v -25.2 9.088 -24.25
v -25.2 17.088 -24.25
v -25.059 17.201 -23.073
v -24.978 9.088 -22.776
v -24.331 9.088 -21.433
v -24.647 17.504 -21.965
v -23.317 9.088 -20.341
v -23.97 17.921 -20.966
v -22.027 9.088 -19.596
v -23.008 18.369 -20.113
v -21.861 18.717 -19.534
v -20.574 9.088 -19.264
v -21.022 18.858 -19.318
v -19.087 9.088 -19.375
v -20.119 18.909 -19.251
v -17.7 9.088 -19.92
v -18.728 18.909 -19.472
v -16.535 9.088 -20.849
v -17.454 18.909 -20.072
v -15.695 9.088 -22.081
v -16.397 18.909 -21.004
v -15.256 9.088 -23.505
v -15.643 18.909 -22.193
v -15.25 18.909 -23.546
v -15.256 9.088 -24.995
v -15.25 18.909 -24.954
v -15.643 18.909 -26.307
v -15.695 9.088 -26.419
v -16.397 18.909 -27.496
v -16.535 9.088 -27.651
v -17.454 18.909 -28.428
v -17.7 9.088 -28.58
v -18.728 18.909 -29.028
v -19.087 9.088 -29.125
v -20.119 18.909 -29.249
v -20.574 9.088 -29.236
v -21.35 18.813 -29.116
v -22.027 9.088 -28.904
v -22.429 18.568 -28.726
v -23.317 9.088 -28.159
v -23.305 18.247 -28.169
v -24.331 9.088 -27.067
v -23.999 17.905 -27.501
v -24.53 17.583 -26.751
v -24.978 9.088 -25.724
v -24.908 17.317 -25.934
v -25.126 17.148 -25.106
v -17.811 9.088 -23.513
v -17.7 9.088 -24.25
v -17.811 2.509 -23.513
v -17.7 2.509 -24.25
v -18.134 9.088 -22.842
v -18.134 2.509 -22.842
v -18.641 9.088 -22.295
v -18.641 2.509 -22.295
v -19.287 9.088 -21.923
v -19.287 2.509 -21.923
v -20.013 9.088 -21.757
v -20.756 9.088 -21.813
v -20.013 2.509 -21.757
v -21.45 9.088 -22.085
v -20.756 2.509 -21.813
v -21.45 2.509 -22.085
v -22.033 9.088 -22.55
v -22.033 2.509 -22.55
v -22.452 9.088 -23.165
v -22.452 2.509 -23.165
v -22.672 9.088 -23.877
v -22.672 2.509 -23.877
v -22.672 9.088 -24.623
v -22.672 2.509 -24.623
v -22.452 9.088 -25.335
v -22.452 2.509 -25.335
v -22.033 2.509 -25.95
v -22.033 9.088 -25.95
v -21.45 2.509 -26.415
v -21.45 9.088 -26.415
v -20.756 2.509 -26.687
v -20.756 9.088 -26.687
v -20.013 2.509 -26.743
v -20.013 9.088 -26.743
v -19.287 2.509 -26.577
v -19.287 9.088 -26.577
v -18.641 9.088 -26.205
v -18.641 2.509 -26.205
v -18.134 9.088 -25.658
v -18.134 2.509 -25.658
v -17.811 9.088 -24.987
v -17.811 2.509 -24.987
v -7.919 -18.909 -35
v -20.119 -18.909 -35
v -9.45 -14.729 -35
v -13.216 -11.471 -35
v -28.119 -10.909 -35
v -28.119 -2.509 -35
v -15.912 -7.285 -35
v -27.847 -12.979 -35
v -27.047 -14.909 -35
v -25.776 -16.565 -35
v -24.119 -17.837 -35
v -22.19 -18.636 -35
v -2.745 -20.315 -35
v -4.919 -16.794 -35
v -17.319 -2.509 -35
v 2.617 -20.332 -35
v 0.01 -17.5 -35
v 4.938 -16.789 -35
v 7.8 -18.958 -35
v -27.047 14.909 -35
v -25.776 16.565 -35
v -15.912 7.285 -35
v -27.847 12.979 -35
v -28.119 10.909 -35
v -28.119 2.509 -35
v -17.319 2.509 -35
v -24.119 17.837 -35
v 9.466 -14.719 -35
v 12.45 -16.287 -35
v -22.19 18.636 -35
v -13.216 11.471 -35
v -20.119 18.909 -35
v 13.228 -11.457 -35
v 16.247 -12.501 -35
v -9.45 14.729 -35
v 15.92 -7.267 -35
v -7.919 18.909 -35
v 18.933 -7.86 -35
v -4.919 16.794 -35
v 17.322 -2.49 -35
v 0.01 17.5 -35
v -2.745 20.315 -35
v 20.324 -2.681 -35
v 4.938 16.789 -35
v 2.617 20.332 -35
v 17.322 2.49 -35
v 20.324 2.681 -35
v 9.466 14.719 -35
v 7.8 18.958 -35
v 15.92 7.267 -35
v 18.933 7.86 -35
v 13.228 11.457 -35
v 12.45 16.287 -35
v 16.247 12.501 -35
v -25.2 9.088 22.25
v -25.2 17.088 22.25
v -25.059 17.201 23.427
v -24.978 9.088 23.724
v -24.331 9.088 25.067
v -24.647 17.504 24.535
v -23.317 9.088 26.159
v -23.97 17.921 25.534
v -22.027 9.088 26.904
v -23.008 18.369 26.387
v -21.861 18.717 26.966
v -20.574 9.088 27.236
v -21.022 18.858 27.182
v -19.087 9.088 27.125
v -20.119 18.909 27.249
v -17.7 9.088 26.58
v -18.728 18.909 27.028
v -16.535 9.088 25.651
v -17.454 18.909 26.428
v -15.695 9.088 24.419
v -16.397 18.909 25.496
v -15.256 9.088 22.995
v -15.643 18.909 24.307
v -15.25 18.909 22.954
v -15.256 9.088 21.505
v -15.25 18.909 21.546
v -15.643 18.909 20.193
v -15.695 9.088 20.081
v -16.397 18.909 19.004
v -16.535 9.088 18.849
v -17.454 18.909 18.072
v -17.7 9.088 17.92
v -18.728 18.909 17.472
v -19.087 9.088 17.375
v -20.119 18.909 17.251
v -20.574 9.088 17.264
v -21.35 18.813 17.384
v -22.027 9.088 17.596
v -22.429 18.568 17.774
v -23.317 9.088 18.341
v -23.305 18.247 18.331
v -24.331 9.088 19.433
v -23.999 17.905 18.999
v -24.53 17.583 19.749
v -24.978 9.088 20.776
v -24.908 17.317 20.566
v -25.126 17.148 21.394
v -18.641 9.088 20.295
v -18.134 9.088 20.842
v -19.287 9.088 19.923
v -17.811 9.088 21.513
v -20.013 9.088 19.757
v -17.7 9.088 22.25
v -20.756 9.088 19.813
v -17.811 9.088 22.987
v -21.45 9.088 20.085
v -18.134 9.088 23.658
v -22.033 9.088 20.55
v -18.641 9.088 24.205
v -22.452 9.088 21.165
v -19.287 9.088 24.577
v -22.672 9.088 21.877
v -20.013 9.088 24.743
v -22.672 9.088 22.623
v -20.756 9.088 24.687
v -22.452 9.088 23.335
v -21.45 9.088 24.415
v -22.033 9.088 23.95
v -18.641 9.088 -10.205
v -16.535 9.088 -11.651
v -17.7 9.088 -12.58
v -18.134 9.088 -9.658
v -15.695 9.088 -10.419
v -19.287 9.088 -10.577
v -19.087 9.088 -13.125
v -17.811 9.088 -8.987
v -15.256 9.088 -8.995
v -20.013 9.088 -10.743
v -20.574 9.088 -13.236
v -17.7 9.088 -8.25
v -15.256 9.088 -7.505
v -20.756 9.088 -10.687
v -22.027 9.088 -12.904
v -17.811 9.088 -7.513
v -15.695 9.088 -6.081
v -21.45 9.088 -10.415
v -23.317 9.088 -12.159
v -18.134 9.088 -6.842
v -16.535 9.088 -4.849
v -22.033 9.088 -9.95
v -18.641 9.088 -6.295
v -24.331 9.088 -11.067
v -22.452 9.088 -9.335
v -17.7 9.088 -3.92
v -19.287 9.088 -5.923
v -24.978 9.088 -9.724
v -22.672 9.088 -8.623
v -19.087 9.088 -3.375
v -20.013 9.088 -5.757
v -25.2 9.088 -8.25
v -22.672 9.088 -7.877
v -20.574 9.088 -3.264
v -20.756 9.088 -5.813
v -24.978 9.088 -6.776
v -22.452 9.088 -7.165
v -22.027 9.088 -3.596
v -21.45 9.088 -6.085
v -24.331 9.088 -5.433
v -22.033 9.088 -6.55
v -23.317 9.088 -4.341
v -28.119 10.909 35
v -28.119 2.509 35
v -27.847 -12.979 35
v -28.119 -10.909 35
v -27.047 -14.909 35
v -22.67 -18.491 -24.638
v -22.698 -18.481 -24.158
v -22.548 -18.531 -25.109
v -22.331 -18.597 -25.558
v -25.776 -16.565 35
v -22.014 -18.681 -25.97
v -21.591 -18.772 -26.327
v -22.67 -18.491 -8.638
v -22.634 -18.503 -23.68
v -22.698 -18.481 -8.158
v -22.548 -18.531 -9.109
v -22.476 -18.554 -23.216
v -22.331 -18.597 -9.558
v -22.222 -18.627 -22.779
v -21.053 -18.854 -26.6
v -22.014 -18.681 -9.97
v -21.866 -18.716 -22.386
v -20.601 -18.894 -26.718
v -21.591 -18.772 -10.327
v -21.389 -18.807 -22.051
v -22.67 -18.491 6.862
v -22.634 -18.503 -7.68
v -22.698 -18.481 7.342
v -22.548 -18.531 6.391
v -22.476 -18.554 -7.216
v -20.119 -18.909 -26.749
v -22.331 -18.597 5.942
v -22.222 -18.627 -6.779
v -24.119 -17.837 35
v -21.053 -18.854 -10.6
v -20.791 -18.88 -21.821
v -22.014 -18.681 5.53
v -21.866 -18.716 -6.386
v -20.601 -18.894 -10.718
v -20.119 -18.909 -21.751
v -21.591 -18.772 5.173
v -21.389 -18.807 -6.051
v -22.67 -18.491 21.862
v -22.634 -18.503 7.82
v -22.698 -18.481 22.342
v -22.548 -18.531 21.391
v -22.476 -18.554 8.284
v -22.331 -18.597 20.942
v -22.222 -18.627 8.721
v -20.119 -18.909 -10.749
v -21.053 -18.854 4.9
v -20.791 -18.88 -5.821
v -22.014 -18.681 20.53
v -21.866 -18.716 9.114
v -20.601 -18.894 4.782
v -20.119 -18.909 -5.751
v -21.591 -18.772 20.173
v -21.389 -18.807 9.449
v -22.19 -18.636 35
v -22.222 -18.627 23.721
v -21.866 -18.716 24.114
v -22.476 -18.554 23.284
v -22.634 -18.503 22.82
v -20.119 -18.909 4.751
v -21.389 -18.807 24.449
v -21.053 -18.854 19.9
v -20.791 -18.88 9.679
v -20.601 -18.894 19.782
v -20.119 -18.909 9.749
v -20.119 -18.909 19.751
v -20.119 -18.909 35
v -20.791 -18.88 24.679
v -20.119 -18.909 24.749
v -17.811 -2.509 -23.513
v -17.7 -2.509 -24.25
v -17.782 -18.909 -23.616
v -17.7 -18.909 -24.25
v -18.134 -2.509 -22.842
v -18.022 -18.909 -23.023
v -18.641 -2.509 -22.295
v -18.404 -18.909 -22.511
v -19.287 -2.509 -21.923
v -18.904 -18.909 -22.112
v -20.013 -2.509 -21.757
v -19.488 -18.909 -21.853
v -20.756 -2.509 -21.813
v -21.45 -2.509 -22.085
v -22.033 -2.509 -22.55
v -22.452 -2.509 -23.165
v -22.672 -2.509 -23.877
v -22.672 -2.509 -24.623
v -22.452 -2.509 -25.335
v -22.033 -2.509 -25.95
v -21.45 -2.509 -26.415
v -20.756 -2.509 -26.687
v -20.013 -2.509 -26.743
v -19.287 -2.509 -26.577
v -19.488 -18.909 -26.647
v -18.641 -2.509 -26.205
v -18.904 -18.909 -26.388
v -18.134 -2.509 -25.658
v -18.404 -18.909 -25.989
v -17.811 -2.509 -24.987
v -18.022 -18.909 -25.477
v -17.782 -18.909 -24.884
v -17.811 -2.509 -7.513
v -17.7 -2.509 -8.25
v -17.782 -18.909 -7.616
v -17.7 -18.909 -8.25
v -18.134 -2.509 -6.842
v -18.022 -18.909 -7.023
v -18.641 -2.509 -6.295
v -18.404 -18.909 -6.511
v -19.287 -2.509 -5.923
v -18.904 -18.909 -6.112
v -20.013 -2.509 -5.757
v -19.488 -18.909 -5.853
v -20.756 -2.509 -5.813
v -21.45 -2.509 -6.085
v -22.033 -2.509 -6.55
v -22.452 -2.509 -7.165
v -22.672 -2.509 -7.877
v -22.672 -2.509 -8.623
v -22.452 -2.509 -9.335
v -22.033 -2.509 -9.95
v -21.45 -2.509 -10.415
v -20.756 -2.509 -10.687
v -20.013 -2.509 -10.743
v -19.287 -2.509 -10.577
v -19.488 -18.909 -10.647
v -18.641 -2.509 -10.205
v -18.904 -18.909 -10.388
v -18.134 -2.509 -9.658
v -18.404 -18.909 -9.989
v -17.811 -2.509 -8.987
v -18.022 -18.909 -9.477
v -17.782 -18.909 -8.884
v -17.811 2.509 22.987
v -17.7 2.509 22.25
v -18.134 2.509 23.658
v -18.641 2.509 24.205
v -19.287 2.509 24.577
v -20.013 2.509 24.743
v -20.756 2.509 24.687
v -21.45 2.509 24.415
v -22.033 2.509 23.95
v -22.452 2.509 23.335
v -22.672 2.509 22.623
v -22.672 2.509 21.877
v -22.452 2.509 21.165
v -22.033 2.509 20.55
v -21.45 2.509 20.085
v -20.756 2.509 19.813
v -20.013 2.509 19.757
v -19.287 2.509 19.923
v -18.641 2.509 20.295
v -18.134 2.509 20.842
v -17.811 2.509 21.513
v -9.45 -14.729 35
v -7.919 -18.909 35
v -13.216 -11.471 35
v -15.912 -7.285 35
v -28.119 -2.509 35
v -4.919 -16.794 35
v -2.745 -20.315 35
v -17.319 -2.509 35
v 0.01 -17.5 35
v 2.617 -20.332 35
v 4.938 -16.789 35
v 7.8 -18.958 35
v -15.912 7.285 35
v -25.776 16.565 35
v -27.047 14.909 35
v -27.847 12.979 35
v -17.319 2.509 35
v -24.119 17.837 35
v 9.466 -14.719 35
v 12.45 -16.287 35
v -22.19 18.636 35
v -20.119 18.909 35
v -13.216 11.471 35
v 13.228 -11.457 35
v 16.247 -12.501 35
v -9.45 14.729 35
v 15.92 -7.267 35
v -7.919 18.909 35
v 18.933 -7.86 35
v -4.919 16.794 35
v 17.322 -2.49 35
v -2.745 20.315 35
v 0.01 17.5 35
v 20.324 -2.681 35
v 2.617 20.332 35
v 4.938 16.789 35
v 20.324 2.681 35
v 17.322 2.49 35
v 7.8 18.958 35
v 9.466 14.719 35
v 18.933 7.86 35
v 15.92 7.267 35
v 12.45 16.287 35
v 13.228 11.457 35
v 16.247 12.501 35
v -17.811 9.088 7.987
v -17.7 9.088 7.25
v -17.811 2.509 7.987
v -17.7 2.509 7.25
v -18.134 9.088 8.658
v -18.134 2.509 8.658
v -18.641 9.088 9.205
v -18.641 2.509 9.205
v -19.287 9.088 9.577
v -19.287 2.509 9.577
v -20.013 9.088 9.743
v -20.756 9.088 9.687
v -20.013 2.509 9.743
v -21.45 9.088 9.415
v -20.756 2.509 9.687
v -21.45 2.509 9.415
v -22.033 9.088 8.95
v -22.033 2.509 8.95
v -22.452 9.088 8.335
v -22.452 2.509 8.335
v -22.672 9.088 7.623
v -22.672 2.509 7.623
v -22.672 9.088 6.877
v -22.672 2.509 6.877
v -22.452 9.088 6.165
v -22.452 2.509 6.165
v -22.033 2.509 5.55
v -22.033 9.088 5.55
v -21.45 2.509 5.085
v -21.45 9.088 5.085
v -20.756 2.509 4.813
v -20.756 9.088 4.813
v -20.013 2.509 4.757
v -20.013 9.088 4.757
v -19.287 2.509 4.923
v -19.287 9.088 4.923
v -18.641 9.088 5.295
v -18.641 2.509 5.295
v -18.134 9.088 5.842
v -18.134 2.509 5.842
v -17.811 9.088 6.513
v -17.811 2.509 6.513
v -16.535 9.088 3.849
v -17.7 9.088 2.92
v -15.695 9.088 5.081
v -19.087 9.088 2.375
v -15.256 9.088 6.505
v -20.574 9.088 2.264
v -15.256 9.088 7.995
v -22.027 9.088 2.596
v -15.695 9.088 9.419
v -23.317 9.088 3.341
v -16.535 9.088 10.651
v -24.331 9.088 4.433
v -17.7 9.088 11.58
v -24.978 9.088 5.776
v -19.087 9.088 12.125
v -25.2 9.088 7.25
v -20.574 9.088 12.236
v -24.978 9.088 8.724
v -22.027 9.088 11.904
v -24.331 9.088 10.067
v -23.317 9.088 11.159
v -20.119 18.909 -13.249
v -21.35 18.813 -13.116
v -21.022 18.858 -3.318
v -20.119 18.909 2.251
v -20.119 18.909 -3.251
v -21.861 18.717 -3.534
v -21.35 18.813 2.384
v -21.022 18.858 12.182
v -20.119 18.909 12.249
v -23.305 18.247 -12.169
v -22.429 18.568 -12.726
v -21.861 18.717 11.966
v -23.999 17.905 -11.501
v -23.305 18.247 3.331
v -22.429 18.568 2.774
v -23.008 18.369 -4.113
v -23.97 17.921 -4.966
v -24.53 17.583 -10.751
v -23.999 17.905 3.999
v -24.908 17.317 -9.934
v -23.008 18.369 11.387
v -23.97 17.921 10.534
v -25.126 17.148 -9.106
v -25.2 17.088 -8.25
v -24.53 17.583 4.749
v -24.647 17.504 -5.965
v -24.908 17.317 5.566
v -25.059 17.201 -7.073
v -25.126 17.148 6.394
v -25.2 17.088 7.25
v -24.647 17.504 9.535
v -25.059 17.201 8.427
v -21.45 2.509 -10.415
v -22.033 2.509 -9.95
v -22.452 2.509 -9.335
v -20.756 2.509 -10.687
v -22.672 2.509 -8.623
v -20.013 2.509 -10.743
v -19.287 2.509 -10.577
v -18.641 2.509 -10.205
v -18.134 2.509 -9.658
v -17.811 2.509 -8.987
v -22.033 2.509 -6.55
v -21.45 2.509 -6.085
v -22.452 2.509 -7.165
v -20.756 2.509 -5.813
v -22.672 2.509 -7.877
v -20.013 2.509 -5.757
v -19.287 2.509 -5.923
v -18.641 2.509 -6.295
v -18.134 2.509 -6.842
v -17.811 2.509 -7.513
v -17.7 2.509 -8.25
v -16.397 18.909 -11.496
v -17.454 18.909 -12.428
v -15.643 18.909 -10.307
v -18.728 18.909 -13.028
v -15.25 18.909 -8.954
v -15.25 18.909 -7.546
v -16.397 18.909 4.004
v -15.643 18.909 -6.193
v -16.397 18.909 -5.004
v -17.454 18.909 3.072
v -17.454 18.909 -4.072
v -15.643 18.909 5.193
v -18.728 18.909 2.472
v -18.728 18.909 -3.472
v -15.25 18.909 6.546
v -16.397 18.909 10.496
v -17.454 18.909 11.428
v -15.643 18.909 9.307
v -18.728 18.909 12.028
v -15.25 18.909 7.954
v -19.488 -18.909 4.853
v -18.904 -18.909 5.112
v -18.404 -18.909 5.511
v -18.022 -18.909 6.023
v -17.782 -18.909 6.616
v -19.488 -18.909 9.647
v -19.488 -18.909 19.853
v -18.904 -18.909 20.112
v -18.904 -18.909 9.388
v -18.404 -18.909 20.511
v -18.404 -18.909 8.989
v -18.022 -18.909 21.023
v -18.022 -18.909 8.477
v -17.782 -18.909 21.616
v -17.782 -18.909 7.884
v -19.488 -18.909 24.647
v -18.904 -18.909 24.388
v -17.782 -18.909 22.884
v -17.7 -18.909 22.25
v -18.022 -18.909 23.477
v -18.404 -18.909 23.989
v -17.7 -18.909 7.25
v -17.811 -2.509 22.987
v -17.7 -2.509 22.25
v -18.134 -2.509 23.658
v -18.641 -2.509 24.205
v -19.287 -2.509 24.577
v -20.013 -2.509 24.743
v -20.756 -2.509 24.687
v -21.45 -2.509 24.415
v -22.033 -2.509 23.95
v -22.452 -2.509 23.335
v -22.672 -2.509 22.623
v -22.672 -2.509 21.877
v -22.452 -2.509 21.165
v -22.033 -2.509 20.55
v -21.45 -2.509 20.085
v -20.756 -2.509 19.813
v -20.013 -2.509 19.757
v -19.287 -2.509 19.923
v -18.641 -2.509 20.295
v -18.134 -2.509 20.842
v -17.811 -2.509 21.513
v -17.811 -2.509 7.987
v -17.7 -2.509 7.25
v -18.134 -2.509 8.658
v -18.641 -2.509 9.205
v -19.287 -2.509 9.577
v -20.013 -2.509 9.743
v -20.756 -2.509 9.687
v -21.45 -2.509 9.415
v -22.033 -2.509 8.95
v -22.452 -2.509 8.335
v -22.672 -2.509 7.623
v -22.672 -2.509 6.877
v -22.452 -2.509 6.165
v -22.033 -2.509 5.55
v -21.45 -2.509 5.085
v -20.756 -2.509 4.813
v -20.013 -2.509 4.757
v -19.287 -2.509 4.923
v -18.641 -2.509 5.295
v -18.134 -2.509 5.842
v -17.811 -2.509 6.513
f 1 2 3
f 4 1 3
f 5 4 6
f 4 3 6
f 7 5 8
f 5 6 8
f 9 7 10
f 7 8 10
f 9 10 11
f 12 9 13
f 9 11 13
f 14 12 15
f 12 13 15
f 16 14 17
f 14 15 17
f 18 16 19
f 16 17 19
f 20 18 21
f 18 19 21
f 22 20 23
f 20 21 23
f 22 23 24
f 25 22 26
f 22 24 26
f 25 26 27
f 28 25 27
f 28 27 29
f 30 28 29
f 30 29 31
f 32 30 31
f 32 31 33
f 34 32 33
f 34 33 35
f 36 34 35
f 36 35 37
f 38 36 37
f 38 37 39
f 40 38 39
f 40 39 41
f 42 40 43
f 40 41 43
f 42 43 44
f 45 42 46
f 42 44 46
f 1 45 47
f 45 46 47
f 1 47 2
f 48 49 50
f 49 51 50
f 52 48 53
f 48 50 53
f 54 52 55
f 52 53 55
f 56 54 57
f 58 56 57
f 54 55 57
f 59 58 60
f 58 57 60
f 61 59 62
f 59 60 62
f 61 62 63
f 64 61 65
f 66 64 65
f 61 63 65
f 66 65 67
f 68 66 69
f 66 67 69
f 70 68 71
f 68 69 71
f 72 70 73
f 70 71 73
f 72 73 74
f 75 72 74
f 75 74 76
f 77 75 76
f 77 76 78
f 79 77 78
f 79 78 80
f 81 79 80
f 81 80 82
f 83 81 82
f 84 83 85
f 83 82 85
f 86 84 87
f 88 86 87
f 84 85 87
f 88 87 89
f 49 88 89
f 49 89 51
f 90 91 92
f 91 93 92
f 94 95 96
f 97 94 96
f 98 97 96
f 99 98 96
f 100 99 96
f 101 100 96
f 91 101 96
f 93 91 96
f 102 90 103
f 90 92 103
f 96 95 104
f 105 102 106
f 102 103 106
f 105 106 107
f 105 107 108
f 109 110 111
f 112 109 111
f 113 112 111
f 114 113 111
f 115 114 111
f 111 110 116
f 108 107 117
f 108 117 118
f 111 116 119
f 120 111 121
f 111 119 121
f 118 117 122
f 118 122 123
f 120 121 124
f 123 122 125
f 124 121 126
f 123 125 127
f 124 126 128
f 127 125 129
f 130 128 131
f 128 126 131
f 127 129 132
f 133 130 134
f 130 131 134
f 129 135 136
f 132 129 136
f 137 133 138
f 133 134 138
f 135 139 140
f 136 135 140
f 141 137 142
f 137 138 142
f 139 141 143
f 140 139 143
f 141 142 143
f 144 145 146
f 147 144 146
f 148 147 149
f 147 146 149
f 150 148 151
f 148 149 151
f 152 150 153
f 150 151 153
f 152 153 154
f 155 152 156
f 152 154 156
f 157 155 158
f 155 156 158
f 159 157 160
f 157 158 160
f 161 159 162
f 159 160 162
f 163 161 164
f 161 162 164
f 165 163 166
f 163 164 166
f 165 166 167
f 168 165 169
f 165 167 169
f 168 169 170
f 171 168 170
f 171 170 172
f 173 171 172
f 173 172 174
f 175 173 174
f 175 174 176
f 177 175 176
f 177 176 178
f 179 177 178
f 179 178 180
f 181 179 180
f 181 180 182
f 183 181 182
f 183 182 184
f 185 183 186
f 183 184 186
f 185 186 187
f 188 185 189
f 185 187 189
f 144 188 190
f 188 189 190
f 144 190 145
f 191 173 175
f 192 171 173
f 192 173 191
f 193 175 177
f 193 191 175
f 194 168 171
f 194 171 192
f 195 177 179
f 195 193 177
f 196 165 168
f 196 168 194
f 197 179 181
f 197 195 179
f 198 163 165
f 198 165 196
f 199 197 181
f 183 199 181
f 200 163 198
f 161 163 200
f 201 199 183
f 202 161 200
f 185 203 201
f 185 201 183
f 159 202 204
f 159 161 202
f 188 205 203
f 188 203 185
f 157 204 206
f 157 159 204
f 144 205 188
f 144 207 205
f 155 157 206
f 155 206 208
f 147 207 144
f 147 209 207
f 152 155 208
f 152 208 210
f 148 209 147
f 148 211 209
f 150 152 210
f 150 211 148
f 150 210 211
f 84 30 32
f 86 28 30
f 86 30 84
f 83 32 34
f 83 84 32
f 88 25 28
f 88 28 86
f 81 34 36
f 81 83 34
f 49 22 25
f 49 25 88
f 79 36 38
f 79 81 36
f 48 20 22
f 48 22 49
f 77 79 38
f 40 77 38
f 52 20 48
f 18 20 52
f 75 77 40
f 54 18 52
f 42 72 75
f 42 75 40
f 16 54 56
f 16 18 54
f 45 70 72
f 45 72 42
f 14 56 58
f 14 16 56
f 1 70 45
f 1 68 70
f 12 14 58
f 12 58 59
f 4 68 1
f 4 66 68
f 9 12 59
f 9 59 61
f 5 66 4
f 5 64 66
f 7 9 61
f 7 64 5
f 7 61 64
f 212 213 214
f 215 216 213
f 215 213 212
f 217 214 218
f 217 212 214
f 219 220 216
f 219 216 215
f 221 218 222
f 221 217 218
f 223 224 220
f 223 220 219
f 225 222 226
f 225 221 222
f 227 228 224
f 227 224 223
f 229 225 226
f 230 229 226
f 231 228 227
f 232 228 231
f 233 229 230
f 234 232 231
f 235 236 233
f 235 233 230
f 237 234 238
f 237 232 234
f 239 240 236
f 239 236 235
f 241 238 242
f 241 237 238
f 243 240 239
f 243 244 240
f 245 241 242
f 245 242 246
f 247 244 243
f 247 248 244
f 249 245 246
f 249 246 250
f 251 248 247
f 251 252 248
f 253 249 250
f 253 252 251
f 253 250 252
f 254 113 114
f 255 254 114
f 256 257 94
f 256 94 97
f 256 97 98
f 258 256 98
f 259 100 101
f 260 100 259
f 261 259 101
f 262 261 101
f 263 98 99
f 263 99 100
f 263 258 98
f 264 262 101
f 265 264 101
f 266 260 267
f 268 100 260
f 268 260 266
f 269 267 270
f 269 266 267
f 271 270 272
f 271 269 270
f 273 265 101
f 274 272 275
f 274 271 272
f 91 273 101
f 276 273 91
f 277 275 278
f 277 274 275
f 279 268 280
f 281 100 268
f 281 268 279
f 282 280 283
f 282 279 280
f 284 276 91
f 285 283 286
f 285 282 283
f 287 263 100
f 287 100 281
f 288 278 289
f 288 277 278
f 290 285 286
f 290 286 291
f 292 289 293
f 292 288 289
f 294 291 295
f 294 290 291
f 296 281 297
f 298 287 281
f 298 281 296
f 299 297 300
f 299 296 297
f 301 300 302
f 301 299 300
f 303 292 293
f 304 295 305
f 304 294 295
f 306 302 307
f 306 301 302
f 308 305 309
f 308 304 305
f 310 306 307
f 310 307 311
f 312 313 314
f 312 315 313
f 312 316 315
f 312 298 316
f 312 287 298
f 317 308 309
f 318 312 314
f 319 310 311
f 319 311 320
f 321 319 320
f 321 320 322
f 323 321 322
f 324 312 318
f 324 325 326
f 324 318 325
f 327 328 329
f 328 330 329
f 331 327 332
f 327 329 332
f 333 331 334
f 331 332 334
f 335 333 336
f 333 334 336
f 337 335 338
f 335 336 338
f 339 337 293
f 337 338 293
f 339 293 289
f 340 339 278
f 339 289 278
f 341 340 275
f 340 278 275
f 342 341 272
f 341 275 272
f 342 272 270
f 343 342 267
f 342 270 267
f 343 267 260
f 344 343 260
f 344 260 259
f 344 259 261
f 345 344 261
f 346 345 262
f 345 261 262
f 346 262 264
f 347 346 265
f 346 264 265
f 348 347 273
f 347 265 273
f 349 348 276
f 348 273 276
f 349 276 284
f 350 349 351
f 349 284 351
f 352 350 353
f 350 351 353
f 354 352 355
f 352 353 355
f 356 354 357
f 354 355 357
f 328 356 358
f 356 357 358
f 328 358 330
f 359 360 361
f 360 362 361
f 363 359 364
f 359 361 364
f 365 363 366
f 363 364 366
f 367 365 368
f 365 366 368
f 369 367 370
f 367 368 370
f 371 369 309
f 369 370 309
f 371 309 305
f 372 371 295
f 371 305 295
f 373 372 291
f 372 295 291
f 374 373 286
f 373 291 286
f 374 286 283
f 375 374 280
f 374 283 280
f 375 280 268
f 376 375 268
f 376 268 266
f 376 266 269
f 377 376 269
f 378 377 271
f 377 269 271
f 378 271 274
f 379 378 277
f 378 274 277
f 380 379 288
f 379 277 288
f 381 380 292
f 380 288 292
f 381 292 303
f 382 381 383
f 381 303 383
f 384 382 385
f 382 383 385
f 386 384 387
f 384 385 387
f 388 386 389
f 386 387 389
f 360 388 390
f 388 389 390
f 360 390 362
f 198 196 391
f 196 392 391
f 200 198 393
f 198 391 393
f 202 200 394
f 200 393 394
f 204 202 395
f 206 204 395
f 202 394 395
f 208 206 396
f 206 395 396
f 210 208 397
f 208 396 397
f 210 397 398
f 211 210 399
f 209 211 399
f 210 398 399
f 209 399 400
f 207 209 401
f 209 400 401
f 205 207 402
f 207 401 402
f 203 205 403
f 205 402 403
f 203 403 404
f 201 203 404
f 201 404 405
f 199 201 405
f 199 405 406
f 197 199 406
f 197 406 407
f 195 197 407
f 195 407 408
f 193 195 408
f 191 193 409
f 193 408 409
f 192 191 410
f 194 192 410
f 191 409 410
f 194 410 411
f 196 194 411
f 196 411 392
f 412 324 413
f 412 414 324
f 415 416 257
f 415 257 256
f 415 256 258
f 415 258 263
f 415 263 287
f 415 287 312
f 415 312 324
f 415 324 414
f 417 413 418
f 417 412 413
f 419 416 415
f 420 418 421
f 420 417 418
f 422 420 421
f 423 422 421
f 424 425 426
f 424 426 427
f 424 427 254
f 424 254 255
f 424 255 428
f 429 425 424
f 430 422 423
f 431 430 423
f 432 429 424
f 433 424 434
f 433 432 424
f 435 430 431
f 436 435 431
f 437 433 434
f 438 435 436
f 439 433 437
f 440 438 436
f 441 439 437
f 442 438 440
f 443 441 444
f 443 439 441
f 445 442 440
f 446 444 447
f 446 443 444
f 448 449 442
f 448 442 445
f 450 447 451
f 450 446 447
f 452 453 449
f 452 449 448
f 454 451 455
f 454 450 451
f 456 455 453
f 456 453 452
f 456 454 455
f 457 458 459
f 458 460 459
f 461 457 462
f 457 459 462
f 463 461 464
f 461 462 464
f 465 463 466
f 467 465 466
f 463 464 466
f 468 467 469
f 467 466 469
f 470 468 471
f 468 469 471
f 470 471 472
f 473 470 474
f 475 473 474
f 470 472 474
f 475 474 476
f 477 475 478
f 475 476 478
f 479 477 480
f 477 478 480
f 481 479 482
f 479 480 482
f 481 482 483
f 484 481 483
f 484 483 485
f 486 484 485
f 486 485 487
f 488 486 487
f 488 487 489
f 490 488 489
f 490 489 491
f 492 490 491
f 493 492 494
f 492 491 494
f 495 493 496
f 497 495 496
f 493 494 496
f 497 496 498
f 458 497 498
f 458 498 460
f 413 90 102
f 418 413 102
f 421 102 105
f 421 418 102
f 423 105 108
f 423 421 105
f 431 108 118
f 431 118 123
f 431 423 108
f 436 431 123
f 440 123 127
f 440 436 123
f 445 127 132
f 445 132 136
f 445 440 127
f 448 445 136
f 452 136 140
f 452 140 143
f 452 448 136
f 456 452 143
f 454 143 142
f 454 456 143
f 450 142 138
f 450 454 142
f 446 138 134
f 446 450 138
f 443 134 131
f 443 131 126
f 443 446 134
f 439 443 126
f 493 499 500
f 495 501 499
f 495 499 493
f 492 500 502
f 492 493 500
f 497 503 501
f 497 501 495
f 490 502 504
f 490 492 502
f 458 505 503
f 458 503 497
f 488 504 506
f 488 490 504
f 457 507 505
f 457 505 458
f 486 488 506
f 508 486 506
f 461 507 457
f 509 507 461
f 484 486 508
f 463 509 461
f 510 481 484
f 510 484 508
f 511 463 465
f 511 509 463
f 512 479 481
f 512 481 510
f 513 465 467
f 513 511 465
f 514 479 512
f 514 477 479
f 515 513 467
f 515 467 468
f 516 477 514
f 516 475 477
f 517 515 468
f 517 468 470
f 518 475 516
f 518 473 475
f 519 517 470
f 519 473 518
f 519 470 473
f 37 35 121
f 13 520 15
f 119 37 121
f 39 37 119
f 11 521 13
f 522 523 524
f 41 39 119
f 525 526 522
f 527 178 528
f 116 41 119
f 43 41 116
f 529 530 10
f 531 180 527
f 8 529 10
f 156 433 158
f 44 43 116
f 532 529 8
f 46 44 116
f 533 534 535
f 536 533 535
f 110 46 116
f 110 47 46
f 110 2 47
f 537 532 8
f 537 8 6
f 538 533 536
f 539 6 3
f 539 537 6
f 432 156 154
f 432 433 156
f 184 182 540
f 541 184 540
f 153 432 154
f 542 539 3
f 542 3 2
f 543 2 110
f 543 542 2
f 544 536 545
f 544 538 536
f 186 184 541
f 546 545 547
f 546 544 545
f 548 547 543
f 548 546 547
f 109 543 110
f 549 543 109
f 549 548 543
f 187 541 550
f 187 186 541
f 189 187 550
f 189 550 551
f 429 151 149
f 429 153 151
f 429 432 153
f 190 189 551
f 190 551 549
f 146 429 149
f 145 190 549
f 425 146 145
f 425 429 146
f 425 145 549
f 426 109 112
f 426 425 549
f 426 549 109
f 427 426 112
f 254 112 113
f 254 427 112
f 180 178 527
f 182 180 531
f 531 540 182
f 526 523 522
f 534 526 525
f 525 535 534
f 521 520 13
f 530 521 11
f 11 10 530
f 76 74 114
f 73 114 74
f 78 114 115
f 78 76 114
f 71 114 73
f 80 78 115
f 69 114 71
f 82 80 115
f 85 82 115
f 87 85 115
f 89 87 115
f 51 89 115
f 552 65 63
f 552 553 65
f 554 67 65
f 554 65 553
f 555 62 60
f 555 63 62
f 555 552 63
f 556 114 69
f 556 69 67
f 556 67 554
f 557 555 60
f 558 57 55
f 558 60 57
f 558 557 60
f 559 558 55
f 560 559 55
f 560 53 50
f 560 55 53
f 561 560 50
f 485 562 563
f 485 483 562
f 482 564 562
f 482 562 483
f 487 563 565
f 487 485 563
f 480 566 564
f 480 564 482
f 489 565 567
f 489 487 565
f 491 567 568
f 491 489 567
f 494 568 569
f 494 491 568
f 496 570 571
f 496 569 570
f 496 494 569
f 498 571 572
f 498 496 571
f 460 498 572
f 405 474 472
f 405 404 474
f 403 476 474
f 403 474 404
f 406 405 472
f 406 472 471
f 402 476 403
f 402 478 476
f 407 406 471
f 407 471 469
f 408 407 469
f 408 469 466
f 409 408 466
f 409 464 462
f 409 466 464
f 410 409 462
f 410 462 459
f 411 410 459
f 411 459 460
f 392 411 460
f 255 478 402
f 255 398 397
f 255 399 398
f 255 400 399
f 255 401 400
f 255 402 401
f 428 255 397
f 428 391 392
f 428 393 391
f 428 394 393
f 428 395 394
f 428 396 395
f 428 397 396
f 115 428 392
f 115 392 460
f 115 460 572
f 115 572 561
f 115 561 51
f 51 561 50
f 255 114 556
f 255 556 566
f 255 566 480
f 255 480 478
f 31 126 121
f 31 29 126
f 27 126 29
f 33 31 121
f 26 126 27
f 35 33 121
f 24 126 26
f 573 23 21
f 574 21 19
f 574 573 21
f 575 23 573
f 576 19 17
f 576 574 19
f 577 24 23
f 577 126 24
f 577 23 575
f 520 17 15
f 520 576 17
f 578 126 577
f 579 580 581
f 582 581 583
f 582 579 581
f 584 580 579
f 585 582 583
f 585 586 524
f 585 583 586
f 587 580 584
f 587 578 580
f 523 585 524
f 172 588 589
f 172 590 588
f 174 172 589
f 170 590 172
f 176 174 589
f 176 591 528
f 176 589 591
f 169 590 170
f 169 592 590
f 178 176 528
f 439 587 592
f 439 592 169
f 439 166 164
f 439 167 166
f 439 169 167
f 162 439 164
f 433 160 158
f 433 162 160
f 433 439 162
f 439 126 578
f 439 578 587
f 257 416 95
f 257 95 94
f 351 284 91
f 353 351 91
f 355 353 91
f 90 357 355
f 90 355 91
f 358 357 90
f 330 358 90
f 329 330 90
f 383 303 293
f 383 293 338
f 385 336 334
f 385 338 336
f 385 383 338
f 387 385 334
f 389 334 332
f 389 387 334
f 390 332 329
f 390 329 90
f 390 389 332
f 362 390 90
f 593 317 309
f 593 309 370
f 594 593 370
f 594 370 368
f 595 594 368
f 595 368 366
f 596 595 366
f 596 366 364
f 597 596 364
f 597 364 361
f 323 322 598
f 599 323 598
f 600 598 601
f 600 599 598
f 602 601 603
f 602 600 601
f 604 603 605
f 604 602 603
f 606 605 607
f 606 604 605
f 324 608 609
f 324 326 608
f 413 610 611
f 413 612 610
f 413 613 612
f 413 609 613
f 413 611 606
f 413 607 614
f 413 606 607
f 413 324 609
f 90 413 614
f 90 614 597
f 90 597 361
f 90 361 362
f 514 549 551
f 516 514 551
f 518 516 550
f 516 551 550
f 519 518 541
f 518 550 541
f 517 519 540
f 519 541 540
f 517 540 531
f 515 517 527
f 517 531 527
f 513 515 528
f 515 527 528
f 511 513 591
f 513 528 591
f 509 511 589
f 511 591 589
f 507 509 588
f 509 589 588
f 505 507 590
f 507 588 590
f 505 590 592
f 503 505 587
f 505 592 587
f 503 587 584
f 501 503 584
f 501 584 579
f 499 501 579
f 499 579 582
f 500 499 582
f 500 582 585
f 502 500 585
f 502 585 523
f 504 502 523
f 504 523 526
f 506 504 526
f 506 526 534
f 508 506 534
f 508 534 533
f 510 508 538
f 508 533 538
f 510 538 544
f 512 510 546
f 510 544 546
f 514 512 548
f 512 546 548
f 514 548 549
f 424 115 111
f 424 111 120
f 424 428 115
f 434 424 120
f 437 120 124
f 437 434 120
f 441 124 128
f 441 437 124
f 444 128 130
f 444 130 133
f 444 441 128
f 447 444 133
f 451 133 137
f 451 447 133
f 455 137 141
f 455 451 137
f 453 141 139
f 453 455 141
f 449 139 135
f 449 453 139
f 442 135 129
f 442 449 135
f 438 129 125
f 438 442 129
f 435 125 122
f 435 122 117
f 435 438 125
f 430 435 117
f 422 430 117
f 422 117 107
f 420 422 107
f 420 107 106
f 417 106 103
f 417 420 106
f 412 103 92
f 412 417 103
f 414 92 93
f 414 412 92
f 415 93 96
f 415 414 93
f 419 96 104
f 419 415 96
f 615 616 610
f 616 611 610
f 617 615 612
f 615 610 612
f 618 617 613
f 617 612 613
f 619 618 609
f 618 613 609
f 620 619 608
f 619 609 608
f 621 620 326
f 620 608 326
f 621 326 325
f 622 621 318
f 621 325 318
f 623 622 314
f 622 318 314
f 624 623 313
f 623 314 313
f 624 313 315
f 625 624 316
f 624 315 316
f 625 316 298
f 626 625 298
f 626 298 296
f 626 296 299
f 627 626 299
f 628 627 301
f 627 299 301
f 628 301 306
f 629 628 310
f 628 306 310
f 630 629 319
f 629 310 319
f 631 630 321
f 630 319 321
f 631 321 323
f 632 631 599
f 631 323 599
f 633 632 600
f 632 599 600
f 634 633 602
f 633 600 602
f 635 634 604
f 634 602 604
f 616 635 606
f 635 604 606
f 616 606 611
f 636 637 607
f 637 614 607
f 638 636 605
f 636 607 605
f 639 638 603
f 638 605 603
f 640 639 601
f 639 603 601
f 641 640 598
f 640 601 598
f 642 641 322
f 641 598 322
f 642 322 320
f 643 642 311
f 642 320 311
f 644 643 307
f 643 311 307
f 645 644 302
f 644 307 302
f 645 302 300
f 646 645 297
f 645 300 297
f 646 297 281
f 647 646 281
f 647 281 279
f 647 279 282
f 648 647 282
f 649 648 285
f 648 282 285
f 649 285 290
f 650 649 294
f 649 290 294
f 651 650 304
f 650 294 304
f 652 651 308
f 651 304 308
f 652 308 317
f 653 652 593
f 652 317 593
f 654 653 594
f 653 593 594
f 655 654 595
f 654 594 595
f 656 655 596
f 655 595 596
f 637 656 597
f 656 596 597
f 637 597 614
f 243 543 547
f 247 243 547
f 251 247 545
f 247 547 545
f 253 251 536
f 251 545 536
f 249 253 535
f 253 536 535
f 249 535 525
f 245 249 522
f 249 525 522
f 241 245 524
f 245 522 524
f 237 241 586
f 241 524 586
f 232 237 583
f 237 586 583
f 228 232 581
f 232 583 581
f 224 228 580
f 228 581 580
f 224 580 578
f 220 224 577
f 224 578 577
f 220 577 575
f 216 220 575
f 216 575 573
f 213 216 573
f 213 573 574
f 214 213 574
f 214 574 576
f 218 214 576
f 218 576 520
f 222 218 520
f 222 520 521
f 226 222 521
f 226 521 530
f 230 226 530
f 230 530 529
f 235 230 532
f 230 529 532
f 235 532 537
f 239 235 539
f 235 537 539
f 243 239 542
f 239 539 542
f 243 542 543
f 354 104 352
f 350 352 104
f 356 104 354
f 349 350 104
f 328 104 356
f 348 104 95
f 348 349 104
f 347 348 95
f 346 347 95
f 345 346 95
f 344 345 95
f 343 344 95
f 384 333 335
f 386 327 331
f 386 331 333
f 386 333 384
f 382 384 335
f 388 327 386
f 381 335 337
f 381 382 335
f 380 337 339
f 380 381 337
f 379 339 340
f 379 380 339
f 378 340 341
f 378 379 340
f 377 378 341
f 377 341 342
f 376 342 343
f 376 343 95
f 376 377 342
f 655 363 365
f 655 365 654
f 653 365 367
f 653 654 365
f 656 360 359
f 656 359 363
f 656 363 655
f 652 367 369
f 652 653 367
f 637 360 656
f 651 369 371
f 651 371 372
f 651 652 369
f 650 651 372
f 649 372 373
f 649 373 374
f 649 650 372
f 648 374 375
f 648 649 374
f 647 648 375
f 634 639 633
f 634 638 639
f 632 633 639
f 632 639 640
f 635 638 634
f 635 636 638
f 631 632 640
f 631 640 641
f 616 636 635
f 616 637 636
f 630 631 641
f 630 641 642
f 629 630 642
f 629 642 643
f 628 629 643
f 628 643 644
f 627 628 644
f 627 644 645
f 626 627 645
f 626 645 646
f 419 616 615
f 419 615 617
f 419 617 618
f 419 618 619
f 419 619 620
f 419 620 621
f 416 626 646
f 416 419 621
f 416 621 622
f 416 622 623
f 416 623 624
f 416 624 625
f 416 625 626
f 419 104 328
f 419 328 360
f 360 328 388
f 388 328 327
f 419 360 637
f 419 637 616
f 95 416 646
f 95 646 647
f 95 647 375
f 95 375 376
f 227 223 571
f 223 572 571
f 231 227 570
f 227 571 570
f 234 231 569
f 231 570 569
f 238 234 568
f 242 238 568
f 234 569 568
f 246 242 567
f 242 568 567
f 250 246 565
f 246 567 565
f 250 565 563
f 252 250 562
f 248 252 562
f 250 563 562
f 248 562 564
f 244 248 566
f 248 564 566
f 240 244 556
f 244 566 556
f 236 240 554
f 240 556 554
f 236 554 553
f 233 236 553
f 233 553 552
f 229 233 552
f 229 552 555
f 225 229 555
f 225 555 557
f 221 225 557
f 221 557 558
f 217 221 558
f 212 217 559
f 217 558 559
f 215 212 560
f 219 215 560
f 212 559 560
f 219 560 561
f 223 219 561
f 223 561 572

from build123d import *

# Parameters (mm, degrees)
F1_DEPTH       = 35
F3_D           = 5
F3_START       = 1.8205079
F3_CBORE_D     = 10
F3_CBORE_DEPTH = 8


with BuildPart() as f1:
    # F0 (on Top) → F1 (new body, symmetric)
    with BuildSketch(Plane.XY):
        with BuildLine():
            ThreePointArc((-17.3192642082, 2.5086026559), (17.5, 0), (-17.3192642082, -2.5086026559))
            Line((-17.3192642082, -2.5086026559), (-28.1192642082, -2.5086026559))
            Line((-28.1192642082, -2.5086026559), (-28.1192642082, -10.9086026559))
            ThreePointArc((-28.1192642082, -10.9086026559), (-25.7761184577, -16.5654569054), (-20.1192642082, -18.9086026559))
            Line((-20.1192642082, -18.9086026559), (-7.9192642082, -18.9086026559))
            ThreePointArc((-7.9192642082, -18.9086026559), (20.5, 0), (-7.9192642082, 18.9086026559))
            Line((-7.9192642082, 18.9086026559), (-20.1192642082, 18.9086026559))
            ThreePointArc((-20.1192642082, 18.9086026559), (-25.7761184577, 16.5654569054), (-28.1192642082, 10.9086026559))
            Line((-28.1192642082, 10.9086026559), (-28.1192642082, 2.5086026559))
            Line((-28.1192642082, 2.5086026559), (-17.3192642082, 2.5086026559))
        make_face()
    extrude(amount=F1_DEPTH, both=True)

    # F3 (through all)
    # its depths count from where the whole tool has entered the part; down to there all is cleared
    with Locations(Plane(origin=(0, 18.9086026559, 0), x_dir=(-1, 0, 0), z_dir=(0, 1, 0)).offset(-F3_START)):
        with Locations((20.2, 22.25), (20.2, 7.25), (20.2, -8.25), (20.2, -24.25)):
            CounterBoreHole(F3_D / 2, F3_CBORE_D / 2, F3_CBORE_DEPTH)


solid = f1.part
